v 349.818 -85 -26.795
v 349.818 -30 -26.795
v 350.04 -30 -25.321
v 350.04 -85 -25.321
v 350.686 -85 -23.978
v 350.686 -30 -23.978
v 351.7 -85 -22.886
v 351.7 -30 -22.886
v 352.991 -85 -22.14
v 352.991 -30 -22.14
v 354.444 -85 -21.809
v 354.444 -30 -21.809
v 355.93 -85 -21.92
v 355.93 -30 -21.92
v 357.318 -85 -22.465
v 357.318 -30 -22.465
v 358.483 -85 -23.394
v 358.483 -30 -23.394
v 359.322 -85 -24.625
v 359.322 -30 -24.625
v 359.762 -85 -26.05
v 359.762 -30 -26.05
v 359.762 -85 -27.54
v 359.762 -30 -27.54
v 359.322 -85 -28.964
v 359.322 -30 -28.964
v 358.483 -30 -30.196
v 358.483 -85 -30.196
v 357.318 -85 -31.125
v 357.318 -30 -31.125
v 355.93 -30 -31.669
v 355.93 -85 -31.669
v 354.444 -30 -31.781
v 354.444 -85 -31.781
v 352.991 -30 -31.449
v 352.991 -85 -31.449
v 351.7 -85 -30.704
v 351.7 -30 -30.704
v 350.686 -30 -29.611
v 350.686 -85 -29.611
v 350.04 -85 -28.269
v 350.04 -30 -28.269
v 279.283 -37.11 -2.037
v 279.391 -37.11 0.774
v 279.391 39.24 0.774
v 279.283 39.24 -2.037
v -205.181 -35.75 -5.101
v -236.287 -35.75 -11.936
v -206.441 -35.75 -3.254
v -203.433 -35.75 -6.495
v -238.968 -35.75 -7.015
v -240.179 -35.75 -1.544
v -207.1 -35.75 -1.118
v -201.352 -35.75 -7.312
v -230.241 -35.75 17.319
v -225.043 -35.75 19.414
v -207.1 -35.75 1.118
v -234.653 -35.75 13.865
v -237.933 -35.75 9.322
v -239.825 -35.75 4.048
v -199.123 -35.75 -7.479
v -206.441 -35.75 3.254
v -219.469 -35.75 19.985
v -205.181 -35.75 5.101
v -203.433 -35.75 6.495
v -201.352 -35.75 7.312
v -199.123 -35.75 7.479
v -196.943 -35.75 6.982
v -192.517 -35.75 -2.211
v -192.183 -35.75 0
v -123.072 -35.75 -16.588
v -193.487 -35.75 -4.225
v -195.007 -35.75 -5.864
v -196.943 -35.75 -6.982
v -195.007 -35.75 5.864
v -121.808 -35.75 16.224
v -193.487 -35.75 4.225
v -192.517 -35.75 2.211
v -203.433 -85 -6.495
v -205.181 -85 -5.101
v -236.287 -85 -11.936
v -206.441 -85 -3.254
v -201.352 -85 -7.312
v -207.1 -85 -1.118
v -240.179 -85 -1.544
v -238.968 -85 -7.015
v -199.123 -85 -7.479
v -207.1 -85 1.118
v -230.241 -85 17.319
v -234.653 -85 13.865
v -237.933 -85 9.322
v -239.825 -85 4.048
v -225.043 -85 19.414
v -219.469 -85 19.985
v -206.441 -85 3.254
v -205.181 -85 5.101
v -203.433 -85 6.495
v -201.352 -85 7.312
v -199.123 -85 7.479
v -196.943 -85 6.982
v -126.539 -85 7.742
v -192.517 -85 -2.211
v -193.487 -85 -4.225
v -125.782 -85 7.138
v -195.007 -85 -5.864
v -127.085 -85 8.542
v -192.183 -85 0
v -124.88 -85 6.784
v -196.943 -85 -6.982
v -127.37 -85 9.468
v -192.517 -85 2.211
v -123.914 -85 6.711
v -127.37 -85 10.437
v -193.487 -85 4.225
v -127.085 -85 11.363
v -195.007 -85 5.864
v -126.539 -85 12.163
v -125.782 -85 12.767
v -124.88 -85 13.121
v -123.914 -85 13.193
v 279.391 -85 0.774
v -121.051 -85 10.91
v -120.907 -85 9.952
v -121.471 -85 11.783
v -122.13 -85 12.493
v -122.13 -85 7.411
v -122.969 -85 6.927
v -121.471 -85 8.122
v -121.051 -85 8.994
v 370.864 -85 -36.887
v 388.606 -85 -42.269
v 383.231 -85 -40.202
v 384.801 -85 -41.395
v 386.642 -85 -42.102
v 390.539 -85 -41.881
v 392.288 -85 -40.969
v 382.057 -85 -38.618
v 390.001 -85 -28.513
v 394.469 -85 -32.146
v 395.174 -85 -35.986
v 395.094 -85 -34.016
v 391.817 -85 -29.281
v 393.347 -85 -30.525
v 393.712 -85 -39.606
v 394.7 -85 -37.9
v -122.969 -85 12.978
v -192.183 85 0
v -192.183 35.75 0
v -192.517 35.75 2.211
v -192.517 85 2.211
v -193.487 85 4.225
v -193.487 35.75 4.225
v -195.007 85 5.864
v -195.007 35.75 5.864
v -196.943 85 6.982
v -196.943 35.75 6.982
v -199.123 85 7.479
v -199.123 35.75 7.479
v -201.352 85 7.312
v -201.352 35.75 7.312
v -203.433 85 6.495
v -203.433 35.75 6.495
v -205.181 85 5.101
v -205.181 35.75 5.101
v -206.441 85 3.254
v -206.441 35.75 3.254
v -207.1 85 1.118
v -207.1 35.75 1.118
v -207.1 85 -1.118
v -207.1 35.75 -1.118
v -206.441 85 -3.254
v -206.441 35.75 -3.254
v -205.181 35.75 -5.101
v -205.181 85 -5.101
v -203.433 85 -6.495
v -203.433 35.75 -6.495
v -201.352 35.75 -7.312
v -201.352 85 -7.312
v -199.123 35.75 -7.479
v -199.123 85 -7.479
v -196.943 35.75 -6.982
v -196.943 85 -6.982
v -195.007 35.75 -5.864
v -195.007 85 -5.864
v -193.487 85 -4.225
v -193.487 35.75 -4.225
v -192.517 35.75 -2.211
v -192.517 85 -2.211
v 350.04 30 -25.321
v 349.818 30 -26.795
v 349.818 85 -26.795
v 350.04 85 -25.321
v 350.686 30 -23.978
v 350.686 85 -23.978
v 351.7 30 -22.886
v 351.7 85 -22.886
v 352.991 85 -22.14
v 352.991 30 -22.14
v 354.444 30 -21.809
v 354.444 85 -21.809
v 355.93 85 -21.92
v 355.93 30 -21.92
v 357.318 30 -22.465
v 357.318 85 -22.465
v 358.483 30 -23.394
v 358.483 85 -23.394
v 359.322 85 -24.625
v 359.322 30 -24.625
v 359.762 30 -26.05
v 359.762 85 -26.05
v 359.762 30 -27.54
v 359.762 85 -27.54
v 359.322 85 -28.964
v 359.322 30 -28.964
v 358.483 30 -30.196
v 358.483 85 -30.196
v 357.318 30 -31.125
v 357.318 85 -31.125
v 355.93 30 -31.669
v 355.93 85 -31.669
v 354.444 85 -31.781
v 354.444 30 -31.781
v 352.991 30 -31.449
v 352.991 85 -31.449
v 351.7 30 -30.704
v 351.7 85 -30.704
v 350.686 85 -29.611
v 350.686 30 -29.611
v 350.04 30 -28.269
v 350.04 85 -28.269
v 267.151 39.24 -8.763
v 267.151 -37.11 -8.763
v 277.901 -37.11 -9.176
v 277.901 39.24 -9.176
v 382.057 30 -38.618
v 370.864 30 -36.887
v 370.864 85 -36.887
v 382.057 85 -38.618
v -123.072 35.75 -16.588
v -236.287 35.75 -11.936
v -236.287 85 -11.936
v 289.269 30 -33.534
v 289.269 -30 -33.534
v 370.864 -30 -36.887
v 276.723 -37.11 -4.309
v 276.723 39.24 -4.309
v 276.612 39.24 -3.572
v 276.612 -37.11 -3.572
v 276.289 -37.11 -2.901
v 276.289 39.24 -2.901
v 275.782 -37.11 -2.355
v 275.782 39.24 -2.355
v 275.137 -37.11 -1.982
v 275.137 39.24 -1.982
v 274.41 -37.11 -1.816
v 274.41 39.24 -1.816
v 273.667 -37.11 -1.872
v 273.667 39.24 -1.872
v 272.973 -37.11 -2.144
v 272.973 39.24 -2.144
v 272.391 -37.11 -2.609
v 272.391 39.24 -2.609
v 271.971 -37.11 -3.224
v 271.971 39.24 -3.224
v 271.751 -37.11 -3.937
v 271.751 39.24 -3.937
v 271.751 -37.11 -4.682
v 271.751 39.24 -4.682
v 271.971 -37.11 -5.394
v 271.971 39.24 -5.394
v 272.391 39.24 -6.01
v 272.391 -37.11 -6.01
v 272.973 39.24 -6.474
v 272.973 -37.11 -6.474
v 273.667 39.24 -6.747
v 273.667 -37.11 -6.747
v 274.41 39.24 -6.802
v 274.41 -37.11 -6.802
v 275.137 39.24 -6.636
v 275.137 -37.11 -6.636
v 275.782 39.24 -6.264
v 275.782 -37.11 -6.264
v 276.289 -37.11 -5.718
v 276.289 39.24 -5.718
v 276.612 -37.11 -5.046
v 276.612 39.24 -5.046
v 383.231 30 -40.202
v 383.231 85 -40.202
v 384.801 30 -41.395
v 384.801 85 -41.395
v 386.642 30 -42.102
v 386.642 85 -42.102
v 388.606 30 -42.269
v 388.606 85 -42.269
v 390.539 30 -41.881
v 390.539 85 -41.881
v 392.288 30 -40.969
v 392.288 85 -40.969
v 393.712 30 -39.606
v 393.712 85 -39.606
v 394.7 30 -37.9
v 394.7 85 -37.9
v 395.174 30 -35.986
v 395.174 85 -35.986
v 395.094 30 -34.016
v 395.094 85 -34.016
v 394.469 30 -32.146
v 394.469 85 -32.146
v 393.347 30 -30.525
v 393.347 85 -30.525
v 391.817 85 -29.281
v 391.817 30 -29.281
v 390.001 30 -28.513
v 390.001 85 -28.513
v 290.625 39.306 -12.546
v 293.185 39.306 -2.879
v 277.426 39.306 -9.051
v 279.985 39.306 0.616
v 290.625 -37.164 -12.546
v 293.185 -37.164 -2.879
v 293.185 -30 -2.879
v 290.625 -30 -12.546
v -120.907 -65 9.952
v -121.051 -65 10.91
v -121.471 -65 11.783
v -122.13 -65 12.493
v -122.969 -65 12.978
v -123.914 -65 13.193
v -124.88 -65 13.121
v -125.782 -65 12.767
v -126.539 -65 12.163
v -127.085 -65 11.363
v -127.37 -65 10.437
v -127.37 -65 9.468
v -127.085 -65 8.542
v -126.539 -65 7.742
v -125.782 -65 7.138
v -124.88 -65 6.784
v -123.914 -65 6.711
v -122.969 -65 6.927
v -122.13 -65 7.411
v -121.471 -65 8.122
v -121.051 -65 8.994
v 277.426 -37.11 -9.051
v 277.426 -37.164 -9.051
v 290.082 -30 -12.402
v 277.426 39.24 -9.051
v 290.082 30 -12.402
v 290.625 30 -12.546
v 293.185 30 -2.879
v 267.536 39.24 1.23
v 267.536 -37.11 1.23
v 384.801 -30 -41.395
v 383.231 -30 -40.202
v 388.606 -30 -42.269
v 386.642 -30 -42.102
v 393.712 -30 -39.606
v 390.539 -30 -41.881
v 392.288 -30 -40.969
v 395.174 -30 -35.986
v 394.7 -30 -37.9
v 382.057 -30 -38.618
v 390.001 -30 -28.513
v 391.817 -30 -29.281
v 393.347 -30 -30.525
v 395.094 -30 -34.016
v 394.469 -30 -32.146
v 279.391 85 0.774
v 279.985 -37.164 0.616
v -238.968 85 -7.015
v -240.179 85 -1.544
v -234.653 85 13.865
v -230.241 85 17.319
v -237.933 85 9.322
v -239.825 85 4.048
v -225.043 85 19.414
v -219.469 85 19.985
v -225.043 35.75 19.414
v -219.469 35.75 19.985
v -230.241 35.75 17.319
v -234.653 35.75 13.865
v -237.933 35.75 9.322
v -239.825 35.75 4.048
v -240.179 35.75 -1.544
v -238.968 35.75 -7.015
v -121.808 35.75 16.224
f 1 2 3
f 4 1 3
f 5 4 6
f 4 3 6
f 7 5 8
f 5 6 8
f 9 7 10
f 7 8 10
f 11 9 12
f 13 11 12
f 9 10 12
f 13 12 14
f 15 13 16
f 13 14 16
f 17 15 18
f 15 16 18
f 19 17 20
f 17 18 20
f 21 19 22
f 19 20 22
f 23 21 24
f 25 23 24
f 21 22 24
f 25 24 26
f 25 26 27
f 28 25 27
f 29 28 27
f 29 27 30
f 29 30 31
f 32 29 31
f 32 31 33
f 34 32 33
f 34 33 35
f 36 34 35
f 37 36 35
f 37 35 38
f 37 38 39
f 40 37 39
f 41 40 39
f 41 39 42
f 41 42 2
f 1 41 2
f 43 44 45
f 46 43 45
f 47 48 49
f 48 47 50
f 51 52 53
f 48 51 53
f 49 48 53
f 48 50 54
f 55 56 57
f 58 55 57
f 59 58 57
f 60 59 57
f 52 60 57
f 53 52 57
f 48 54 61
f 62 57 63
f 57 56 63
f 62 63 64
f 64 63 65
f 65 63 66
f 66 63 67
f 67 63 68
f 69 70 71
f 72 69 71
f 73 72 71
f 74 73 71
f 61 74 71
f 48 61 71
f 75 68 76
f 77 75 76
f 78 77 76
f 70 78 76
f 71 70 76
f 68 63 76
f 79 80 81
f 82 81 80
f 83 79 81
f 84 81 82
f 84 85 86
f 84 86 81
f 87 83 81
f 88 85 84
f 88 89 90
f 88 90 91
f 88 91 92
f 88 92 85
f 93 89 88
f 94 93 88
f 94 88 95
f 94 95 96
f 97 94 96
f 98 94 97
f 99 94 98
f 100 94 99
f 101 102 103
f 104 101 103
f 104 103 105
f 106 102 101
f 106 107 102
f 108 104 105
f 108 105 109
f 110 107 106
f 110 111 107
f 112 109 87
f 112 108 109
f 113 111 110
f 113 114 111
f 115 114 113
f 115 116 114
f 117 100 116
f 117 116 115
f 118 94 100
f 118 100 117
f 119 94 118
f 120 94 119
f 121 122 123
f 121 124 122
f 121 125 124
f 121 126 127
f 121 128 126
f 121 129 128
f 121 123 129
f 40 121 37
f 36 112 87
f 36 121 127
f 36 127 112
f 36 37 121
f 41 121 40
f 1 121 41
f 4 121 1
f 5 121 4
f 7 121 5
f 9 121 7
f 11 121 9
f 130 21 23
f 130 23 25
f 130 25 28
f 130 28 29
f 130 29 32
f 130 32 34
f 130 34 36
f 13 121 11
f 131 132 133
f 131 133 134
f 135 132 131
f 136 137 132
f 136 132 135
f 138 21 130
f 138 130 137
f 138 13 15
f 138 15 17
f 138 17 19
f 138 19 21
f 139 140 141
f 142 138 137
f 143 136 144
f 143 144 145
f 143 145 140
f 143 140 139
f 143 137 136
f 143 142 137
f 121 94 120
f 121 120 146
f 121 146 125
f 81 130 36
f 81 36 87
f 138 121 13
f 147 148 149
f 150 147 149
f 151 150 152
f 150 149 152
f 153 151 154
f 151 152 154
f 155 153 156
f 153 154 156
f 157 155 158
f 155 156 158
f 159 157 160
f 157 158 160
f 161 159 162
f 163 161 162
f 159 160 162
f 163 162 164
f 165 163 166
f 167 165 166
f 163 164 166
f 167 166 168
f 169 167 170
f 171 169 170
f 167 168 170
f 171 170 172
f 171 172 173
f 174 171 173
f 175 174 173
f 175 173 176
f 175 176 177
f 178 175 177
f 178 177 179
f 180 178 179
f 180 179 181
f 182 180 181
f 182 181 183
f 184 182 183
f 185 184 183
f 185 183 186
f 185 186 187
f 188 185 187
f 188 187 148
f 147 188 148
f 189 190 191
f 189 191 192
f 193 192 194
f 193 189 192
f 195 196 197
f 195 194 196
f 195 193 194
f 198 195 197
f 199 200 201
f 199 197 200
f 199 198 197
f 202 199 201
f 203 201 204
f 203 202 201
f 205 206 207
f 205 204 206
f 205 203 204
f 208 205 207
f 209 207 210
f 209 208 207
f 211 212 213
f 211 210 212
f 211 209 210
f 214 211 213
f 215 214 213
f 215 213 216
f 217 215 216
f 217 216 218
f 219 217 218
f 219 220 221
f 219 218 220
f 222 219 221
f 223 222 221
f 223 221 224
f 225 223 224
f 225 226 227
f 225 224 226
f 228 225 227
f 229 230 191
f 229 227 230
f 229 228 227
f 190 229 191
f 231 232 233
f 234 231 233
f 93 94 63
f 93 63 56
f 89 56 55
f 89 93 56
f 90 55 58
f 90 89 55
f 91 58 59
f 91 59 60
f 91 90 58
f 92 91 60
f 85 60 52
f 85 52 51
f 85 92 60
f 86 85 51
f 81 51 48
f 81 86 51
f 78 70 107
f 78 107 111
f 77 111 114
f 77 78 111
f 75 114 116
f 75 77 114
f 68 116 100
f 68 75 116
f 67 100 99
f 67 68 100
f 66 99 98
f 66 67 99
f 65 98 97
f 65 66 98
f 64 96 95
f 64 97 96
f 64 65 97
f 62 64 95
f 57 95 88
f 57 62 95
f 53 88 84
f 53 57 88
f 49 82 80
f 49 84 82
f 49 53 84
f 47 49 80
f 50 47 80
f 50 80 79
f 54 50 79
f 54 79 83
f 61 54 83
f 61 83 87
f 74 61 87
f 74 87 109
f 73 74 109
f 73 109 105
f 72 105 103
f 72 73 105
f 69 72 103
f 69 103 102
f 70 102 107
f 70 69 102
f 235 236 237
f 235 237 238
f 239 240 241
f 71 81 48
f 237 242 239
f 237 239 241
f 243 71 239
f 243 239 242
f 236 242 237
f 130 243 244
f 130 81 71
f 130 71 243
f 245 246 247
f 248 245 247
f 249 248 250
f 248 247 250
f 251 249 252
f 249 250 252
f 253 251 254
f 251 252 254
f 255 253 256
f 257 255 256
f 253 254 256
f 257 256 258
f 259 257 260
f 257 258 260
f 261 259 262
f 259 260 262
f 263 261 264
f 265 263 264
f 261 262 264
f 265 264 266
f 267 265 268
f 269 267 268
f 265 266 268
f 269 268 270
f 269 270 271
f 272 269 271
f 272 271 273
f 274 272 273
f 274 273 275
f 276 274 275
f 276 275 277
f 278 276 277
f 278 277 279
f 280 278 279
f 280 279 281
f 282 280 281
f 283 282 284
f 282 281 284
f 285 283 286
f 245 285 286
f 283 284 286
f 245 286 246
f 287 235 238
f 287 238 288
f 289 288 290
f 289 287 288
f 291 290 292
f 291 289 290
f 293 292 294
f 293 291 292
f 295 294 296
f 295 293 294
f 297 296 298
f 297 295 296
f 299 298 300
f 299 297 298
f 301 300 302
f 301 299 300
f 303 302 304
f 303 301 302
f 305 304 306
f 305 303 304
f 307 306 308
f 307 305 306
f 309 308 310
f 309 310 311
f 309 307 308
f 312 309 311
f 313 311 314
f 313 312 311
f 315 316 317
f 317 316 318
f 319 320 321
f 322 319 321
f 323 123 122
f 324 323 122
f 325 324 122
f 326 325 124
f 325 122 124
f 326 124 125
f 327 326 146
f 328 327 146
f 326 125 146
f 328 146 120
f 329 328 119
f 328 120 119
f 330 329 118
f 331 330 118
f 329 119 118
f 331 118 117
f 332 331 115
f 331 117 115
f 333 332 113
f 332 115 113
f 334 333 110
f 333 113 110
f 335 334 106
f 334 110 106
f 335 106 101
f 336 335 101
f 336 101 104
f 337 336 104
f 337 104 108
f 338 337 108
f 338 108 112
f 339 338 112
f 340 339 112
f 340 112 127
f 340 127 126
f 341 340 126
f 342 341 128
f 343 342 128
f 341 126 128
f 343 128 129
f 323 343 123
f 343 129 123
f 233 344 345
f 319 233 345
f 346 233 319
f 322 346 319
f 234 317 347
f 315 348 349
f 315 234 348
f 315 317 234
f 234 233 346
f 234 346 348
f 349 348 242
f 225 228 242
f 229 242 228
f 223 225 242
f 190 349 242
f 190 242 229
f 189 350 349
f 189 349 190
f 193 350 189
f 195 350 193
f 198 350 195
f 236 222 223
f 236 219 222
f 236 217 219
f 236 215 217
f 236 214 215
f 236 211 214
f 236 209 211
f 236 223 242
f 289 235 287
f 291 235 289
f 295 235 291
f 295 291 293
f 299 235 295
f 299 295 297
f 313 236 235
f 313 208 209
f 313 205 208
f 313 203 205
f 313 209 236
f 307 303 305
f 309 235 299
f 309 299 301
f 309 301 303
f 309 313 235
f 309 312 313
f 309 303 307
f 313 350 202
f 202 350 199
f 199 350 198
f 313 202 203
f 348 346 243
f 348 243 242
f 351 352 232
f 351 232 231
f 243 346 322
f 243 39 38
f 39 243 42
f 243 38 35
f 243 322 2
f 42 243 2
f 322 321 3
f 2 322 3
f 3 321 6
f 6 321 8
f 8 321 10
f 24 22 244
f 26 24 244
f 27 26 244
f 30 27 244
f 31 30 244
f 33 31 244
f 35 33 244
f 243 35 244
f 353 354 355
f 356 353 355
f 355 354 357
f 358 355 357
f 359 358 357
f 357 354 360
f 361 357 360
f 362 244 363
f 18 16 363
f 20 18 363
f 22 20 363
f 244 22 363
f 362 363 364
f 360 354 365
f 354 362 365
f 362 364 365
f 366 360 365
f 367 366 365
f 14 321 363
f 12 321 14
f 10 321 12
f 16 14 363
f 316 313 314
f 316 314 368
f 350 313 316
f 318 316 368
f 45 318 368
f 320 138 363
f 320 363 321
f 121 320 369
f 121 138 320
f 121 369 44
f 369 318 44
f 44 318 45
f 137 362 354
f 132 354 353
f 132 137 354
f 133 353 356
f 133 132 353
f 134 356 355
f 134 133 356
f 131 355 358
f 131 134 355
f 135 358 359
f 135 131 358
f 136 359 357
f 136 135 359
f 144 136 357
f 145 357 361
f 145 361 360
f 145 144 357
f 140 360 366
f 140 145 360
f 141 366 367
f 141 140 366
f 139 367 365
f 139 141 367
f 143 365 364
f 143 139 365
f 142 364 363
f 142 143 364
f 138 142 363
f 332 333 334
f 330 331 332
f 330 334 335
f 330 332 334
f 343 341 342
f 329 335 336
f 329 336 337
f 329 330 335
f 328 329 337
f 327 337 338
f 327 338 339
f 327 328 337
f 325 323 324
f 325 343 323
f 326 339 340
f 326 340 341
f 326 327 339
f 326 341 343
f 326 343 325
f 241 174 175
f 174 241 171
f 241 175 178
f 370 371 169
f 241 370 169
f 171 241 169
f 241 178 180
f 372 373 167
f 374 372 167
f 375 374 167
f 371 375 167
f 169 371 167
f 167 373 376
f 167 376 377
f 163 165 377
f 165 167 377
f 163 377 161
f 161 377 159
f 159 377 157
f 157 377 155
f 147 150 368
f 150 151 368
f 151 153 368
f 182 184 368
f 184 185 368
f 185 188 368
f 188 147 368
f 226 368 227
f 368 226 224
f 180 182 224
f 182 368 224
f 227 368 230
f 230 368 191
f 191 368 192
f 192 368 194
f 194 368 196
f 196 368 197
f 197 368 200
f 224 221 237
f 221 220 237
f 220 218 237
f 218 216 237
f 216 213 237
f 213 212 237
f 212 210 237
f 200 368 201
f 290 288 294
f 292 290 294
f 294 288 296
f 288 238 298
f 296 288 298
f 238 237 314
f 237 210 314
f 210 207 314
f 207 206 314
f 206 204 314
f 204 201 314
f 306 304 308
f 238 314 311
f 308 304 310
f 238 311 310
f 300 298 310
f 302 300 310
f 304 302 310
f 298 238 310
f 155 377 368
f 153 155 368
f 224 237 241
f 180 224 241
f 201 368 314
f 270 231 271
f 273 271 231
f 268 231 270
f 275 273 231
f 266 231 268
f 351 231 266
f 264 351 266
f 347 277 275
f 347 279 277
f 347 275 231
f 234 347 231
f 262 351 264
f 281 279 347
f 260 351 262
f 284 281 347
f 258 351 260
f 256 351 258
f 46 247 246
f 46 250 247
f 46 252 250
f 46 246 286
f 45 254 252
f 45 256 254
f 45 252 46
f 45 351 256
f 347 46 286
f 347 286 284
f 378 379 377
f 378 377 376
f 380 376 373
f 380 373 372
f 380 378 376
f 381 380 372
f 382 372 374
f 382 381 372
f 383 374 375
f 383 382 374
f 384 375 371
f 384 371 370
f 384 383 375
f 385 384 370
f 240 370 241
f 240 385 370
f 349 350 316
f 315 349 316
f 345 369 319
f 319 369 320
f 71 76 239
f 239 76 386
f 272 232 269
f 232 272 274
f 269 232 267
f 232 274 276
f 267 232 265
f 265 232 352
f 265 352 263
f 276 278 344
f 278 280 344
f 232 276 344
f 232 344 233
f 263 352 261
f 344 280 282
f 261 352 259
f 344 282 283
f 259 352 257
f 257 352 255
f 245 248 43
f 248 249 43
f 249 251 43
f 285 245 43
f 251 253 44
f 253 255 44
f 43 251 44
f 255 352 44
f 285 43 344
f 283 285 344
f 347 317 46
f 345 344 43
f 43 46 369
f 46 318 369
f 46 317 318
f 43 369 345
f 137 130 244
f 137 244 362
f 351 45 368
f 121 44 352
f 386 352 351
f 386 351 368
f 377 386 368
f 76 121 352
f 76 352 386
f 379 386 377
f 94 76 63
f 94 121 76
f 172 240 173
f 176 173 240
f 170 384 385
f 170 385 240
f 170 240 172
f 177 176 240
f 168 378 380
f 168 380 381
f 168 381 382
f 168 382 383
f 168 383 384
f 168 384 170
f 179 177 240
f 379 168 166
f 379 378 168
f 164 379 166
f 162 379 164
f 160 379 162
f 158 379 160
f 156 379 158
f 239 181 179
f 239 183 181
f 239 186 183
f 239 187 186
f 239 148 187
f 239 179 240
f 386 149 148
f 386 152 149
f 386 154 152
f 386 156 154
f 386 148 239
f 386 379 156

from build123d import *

# Parameters (mm, degrees)
F1_DEPTH      = 85
F2_W          = 140.1526774555
F2_H          = 71.5
F2_W_2        = 166.0307588987
F2_H_2        = 60
F3_DEPTH      = 60
F4_R          = 5
F5_DEPTH      = 115.001
F5_DEPTH_BACK = 55.001
F6_R          = 7.5
F7_DEPTH      = 120.751
F7_DEPTH_BACK = 49.251
F8_W          = 2.8015428152
F8_H          = 60
F9_DEPTH      = 10
F11_W         = 11.8633863517
F11_H         = 76.3498097658
F12_DEPTH     = 10
F13_R         = 2.5
F14_DEPTH     = 76.3498097658
F15_R         = 3.25
F16_DEPTH     = 20


# Not quite as in the source:
# - a feature of the source that left no trace in its solid (it failed there, or was rolled back) is left out
# - a feature names something its author has since deleted; it is built from what else it names


with BuildPart() as f1:
    # F0 (on Front) → F1 (new body, symmetric)
    with BuildSketch(Plane.XZ):
        with BuildLine():
            Line((279.3908679786, 0.7735525745), (-219.4691173488, 19.9851854498))
            ThreePointArc((-219.4691173488, 19.9851854498), (-237.9331597041, 9.3224734741), (-236.2868942017, -11.9355625752))
            Line((-236.2868942017, -11.9355625752), (370.8640205953, -36.8868572182))
            Line((370.8640205953, -36.8868572182), (382.0565363882, -38.6184028055))
            ThreePointArc((382.0565363882, -38.6184028055), (393.7122397041, -39.6064498563), (390.0009393692, -28.5133030266))
            Line((390.0009393692, -28.5133030266), (279.3908679786, 0.7735525745))
        make_face()
    extrude(amount=F1_DEPTH, both=True)

    # F2 (on face) → F3 (cut)
    with BuildSketch(Plane(origin=(0.44349793, 0, 11.5161148616), x_dir=(0.9992592725, 0, -0.0384825459), z_dir=(0.0384825459, 0, 0.9992592725))):
        with Locations((-192.4187466502, 0)):
            Rectangle(F2_W, F2_H)
        with Locations((373.3601896558, 0)):
            Rectangle(F2_W_2, F2_H_2)
    extrude(amount=-F3_DEPTH, mode=Mode.SUBTRACT)

    # F4 (on face) → F5 (cut, two sides)
    with BuildSketch(Plane(origin=(0, -30, 0), x_dir=(-1, 0, 0), z_dir=(0, 1, 0))) as f5_sk:
        with Locations((-354.8175990582, -26.7948582768)):
            Circle(F4_R)
    extrude(amount=F5_DEPTH, mode=Mode.SUBTRACT)
    extrude(f5_sk.sketch, amount=-F5_DEPTH_BACK, mode=Mode.SUBTRACT)

    # F6 (on face) → F7 (cut, two sides)
    with BuildSketch(Plane.XZ.offset(-35.75)) as f7_sk:
        with Locations((-199.6834129095, 0)):
            Circle(F6_R)
    extrude(amount=F7_DEPTH, mode=Mode.SUBTRACT)
    extrude(f7_sk.sketch, amount=-F7_DEPTH_BACK, mode=Mode.SUBTRACT)

    # F8 (on face) → F9 (cut)
    with BuildSketch(Plane(origin=(18.495209297, 0, 69.8523750243), x_dir=(0.9666885377, 0, -0.2559556038), z_dir=(0.2559556038, 0, 0.9666885377))):
        Polygon((270.5007791519, -37.1644198895), (284.1554284096, -37.1644198895), (284.1554284096, -30), (281.3538855944, -30), (281.3538855944, 30), (284.1554284096, 30), (284.1554284096, 39.305575192), (270.5007791519, 39.305575192), align=None)
        with Locations((282.754657002, 0)):
            Rectangle(F8_W, F8_H)
    extrude(amount=-F9_DEPTH, mode=Mode.SUBTRACT)

    # F11 (on face) → F12 (cut)
    with BuildSketch(Plane(origin=(0.44349793, 0, 11.5161148616), x_dir=(0.9992592725, 0, -0.0384825459), z_dir=(0.0384825459, 0, 0.9992592725))):
        with Locations((273.2224540287, 1.0649263859)):
            Rectangle(F11_W, F11_H)
    extrude(amount=-F12_DEPTH, mode=Mode.SUBTRACT)

    # F13 (on face) → F14 (join, through all)
    with BuildSketch(Plane.XZ.offset(-39.2398312688)):
        with Locations((274.223446846, -4.3092062697)):
            Circle(F13_R)
    extrude(amount=F14_DEPTH)

    # F15 (on face) → F16 (cut)
    with BuildSketch(Plane.XZ.offset(85)):
        with Locations((-124.1565719247, 9.9523849785)):
            Circle(F15_R)
    extrude(amount=-F16_DEPTH, mode=Mode.SUBTRACT)


solid = f1.part
